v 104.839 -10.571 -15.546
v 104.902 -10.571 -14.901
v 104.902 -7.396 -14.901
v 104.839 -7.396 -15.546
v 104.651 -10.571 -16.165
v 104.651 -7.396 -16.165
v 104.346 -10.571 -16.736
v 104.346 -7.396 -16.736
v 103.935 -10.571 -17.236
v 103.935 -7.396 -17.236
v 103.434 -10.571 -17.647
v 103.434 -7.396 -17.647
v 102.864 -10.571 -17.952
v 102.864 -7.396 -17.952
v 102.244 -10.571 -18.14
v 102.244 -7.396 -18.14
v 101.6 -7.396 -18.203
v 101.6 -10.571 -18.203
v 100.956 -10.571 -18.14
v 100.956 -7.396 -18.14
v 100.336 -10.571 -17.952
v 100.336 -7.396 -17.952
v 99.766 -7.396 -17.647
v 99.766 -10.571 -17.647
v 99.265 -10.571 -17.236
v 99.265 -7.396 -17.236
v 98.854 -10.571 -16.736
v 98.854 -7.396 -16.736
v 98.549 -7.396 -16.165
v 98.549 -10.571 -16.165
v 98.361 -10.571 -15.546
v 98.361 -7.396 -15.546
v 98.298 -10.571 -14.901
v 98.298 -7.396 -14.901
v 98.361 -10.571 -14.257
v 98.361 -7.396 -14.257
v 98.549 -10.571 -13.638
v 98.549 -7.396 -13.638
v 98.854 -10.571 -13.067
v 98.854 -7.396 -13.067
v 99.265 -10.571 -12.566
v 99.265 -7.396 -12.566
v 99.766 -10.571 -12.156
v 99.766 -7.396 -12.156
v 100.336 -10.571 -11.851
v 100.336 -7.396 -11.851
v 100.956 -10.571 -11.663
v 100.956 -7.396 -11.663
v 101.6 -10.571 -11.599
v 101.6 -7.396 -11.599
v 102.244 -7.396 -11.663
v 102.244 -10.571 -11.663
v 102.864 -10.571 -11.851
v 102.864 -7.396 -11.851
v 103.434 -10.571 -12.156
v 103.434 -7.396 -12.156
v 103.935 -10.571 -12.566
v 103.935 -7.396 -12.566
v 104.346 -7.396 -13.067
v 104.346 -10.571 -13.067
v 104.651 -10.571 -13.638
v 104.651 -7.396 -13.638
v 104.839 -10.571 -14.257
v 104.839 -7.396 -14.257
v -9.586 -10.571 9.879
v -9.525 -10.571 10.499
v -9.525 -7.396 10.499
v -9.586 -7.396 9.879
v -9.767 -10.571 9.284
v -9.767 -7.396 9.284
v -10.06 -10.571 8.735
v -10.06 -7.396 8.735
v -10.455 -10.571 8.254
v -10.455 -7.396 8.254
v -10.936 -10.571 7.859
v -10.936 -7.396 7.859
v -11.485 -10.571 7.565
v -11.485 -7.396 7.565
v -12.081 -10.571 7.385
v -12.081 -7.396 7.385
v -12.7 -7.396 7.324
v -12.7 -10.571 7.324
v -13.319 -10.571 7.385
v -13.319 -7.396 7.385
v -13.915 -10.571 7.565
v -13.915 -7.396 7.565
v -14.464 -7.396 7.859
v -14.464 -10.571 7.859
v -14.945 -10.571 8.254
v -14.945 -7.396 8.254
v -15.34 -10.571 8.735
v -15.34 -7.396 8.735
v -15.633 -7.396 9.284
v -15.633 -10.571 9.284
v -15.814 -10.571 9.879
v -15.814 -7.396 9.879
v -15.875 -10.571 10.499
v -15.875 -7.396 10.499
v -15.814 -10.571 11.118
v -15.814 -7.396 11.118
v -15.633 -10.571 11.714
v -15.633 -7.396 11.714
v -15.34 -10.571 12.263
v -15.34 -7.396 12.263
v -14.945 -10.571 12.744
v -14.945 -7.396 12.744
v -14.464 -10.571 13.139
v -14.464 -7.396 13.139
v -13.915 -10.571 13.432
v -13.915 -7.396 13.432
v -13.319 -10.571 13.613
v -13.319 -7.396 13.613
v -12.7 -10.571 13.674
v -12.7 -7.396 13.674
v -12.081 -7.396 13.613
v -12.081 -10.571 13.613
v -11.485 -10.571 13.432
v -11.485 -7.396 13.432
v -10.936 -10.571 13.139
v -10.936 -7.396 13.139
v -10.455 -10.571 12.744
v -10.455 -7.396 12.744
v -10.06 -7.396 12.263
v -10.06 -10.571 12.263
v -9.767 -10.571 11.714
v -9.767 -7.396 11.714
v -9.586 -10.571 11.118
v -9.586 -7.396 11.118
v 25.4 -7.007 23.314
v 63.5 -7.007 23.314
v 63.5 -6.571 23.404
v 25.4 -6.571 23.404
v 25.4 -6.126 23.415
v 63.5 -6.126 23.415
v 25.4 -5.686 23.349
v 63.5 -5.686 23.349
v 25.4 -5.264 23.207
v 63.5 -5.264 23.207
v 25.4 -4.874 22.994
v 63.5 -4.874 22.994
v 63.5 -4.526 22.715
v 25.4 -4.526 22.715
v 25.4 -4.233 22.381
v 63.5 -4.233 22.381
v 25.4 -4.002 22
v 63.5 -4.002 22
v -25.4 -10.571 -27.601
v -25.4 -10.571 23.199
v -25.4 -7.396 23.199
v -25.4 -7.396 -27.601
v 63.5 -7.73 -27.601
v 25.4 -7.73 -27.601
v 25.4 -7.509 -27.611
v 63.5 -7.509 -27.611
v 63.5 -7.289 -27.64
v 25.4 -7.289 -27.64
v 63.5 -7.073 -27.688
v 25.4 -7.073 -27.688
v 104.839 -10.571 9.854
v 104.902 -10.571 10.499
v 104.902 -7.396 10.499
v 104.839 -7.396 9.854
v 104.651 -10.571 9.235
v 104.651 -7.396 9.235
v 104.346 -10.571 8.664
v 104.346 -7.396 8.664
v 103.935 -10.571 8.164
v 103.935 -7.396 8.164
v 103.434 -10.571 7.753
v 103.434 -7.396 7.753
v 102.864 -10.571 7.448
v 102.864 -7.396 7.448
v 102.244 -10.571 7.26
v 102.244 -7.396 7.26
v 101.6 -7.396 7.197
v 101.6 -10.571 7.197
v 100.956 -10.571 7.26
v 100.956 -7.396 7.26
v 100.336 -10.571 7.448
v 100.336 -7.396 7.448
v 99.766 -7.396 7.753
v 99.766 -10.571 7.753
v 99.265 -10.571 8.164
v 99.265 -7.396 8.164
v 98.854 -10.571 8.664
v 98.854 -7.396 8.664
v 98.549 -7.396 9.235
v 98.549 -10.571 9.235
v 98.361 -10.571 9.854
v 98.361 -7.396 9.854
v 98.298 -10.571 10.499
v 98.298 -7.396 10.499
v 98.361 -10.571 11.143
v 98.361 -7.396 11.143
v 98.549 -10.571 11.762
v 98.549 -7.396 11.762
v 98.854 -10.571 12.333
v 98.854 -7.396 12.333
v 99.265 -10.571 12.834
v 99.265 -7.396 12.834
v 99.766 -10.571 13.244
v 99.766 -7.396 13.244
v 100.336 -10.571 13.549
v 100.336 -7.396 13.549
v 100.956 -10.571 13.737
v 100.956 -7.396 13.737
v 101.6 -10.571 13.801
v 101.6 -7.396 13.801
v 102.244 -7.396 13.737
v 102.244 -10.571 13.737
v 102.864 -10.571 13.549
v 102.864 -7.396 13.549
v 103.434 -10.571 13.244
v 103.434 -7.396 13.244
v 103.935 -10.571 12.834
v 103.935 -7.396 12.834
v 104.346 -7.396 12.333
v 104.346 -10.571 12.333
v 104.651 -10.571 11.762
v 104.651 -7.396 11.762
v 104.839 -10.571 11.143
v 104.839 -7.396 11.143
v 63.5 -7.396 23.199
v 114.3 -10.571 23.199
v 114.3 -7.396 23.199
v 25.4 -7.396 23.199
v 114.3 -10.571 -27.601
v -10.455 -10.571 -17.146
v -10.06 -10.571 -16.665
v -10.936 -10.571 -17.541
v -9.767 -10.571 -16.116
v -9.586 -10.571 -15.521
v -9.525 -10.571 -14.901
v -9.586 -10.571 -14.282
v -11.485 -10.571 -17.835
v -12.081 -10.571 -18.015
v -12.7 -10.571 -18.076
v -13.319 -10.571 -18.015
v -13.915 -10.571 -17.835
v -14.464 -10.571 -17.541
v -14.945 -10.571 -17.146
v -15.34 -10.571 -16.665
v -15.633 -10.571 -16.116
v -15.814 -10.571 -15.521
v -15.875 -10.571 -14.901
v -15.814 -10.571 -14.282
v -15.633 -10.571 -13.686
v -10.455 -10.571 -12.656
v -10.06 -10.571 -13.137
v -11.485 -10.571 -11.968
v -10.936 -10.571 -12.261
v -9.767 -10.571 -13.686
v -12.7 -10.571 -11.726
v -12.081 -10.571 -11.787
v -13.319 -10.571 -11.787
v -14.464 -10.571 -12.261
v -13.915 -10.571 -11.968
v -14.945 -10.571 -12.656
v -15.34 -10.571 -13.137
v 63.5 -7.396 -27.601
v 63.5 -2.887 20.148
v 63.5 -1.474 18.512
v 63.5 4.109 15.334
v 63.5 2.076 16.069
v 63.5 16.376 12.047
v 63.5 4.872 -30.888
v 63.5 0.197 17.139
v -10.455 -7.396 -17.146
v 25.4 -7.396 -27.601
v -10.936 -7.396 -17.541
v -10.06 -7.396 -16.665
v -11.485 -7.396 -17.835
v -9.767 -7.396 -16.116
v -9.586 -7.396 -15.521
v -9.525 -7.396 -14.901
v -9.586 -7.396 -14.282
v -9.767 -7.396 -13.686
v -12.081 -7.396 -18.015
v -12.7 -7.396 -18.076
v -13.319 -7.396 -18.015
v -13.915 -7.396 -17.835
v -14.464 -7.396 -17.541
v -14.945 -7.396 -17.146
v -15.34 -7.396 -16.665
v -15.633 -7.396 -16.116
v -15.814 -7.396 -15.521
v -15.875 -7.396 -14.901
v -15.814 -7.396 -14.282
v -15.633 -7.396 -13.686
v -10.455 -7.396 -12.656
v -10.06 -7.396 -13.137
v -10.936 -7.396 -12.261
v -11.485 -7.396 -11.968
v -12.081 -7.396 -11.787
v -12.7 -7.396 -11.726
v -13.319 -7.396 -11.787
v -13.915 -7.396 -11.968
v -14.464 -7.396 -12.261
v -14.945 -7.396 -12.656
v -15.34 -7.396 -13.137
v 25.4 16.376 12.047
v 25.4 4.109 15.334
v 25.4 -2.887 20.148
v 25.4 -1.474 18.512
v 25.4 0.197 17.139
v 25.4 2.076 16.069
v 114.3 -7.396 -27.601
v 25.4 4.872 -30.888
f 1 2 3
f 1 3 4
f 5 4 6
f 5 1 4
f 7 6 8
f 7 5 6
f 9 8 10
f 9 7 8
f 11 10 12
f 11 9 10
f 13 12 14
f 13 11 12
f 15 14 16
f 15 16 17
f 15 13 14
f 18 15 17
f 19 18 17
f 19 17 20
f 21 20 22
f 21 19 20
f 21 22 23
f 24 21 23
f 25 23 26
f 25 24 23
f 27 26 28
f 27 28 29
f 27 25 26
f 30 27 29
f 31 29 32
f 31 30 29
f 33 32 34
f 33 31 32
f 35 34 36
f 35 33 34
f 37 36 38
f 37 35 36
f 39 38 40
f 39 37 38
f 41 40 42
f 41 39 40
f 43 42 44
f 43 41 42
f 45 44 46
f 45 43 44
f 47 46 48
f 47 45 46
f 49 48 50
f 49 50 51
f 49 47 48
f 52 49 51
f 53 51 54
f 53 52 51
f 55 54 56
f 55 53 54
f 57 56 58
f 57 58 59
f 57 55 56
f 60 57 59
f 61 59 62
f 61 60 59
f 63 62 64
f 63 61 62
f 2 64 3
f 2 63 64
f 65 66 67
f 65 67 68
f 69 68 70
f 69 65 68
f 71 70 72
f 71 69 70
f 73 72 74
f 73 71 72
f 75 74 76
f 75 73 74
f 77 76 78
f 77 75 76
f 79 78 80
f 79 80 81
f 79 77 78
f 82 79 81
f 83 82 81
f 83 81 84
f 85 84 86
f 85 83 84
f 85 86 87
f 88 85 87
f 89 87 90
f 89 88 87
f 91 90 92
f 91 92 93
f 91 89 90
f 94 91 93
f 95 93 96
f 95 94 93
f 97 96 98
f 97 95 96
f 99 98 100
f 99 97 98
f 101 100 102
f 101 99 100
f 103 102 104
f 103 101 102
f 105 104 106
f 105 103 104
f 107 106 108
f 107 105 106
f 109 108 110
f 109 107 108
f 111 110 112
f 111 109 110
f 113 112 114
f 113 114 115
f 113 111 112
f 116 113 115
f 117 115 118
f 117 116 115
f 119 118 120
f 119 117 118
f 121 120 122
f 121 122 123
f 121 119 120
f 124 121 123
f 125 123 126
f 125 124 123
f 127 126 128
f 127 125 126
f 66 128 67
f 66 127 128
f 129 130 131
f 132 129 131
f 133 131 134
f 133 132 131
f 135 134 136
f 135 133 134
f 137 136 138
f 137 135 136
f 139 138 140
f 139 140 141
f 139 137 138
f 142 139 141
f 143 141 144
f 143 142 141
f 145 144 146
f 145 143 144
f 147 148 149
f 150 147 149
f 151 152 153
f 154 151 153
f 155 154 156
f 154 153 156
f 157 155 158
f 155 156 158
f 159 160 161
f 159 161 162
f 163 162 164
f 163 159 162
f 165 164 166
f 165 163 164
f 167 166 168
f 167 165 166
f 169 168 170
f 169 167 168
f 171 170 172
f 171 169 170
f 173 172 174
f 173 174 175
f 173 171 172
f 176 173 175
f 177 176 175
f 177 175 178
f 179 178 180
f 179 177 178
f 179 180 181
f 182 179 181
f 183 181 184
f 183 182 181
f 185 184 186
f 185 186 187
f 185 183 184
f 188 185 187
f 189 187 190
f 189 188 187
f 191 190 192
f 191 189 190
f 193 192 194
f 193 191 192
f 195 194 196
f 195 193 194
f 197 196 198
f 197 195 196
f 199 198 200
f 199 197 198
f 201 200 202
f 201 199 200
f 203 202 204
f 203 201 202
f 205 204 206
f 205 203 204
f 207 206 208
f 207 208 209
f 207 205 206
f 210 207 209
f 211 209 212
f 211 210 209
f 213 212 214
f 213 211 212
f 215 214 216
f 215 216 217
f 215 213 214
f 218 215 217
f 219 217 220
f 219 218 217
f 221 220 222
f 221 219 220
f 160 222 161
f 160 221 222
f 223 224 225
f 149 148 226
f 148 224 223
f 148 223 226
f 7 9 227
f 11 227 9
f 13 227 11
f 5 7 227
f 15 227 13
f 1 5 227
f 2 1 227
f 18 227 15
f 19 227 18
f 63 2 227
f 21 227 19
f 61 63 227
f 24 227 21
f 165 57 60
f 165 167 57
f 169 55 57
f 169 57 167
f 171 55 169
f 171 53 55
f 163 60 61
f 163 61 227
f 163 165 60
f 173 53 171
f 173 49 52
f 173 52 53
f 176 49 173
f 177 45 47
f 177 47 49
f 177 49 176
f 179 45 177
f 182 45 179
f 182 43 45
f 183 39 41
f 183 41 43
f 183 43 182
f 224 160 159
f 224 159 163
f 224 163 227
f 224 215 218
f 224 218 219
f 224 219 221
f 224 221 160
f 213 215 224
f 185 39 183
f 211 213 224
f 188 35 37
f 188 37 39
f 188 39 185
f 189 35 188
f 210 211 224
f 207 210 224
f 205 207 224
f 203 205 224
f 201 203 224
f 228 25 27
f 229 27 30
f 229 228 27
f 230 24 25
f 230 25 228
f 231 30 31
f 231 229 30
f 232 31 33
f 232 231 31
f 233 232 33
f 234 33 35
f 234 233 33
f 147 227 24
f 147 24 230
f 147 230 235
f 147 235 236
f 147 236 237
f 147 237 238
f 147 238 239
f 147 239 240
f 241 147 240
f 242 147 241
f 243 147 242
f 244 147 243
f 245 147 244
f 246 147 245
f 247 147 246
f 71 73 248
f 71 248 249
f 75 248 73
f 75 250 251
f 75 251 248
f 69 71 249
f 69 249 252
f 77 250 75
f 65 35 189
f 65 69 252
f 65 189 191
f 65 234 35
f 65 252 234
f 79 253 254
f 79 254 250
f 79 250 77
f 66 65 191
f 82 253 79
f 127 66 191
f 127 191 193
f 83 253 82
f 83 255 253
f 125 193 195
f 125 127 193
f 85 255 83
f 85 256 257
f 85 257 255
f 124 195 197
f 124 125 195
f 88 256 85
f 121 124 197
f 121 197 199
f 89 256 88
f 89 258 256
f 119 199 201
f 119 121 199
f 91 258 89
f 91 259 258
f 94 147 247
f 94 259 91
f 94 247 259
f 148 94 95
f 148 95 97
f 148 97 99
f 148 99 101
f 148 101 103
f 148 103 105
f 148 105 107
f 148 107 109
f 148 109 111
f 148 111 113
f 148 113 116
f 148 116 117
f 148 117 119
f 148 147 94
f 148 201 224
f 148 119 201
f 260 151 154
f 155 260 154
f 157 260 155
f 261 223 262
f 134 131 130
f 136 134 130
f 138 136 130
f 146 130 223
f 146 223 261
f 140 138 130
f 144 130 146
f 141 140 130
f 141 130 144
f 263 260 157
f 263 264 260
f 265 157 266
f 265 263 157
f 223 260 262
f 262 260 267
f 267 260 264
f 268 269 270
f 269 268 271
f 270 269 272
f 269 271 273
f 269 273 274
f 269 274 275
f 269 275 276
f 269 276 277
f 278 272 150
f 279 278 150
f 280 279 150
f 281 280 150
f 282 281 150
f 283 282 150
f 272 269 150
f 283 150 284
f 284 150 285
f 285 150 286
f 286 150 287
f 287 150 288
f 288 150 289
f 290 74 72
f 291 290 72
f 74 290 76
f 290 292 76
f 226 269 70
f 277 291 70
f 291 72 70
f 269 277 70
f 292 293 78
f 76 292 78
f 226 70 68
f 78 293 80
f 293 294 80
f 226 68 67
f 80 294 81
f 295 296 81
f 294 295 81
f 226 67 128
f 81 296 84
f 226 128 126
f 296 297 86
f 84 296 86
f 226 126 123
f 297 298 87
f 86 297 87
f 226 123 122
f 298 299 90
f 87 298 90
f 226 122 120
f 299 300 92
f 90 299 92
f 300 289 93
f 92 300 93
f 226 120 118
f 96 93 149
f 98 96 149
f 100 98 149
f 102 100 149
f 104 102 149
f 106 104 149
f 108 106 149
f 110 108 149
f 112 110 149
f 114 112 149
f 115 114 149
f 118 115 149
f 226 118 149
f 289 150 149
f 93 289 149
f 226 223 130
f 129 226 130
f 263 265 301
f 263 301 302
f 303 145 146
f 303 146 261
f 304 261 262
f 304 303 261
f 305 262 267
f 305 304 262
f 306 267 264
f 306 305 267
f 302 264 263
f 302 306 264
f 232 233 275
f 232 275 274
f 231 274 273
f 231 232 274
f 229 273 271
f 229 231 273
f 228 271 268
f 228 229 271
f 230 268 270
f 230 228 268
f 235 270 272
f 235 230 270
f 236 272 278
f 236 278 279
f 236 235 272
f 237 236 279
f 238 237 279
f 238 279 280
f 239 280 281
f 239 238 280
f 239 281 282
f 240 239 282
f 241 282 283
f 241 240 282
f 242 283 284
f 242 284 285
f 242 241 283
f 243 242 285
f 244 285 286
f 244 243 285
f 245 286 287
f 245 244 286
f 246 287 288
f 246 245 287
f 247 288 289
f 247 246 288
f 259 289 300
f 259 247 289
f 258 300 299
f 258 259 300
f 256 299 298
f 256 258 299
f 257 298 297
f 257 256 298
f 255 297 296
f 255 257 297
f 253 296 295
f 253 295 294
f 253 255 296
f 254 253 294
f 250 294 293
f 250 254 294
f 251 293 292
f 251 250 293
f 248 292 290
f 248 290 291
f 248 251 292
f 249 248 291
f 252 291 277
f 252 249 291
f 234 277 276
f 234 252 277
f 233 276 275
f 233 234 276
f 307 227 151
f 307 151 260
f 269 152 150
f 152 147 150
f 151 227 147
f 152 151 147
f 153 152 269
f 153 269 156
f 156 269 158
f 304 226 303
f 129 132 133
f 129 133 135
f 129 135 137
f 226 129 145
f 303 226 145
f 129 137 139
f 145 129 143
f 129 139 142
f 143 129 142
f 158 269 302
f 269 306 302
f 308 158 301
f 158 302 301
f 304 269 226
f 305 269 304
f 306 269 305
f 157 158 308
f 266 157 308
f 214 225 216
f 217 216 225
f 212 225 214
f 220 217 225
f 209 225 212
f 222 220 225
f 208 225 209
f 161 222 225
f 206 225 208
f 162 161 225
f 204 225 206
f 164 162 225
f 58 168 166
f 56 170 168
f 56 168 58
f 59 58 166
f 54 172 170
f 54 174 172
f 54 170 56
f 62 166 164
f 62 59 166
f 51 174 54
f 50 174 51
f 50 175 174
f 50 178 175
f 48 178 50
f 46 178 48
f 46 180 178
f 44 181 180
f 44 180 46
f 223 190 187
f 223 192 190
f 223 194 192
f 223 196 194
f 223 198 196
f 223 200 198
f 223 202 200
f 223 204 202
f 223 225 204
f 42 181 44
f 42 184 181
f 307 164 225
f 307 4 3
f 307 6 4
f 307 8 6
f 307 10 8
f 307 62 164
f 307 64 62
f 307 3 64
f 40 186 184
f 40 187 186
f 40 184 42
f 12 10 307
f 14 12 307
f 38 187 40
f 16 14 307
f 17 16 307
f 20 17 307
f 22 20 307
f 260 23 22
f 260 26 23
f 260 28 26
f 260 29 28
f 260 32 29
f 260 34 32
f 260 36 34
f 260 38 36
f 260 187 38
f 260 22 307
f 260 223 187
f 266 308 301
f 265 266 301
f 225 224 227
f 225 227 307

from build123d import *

# Parameters (mm, degrees)
BOSS_EXTRUDE1_DEPTH   = 88.9
SKETCH2_W             = 88.9
SKETCH2_H             = 50.8
BOSS_EXTRUDE2_DEPTH   = 3.175
FILLET2_DEPTH         = 25.4
FILLET2_START         = 63.5
FILLET2_2_DEPTH       = 25.4
FILLET2_START_2       = 25.4
FILLET2_3_DEPTH       = 38.1
FILLET2_4_DEPTH       = 38.1
FILLET2_START_3       = -25.4
FILLET2_5_OUTLINE_W   = 3.175
FILLET2_5_OUTLINE_H   = 50.8
FILLET2_5_DEPTH       = 139.7
FILLET2_START_4       = -10.570754214
FILLET2_6_OUTLINE_R   = 3.302
FILLET2_6_OUTLINE_R_2 = 3.175
FILLET2_6_DEPTH       = 3.175


with BuildPart() as part:
    # Sketch1 → Boss-Extrude1 (new body)
    with BuildSketch(Plane(origin=(0, 0, 0), x_dir=(0, 0, -1), z_dir=(1, 0, 0))):
        Polygon((27.601330486, -7.395754214), (-23.198669514, -7.395754214), (-27.601330486, 7.395754214), align=None)
    extrude(amount=BOSS_EXTRUDE1_DEPTH)

    # Sketch2 → Boss-Extrude2 (add)
    with BuildSketch(Plane.XZ.offset(7.395754214)):
        with Locations((44.45, -2.201330486)):
            Rectangle(SKETCH2_W, SKETCH2_H)
    extrude(amount=BOSS_EXTRUDE2_DEPTH)

    # Fillet2: read off the stored shape, not the designer's step
    # Fillet2 outline → Fillet2 (cut)
    with BuildSketch(Plane.YZ):
        Polygon((-7.395754214, 23.198669514), (-7.395754214, -27.601330486), (7.395754214, 27.601330486), align=None)
    extrude(amount=FILLET2_DEPTH, mode=Mode.SUBTRACT)

    # Fillet2 2 outline → Fillet2 2 (cut)
    with BuildSketch(Plane.YZ.offset(FILLET2_START)):
        Polygon((-7.395754214, 23.198669514), (-7.395754214, -27.601330486), (7.395754214, 27.601330486), align=None)
    extrude(amount=FILLET2_2_DEPTH, mode=Mode.SUBTRACT)

    # Fillet2 3 outline → Fillet2 3 (cut)
    with BuildSketch(Plane.YZ.offset(FILLET2_START_2)):
        with BuildLine():
            Line((7.395754214, 27.601330486), (-7.00664086, 23.314488275))
            ThreePointArc((-7.00664086, 23.314488275), (-5.264031089, 23.20711322), (-4.002401192, 22.000254398))
            ThreePointArc((-4.002401192, 22.000254398), (-0.667927102, 17.789753466), (4.108752341, 15.334072492))
            Line((4.108752341, 15.334072492), (7.395754214, 27.601330486))
        make_face()
    extrude(amount=FILLET2_3_DEPTH, mode=Mode.SUBTRACT)

    # Fillet2 4 outline → Fillet2 4 (add)
    with BuildSketch(Plane.YZ.offset(FILLET2_START_2)):
        with BuildLine():
            Line((4.108752341, 15.334072492), (-7.395754214, -27.601330486))
            Line((-7.395754214, -27.601330486), (-7.730151558, -27.601330486))
            ThreePointArc((-7.730151558, -27.601330486), (-7.39861503, -27.623060538), (-7.072751183, -27.687878887))
            Line((-7.072751183, -27.687878887), (4.87150378, -30.888332359))
            Line((4.87150378, -30.888332359), (16.376010335, 12.04707062))
            Line((16.376010335, 12.04707062), (4.108752341, 15.334072492))
        make_face()
    extrude(amount=FILLET2_4_DEPTH)

    # Fillet2 5 outline → Fillet2 5 (add)
    with BuildSketch(Plane.YZ.offset(FILLET2_START_3)):
        with Locations((-8.983254214, -2.201330486)):
            Rectangle(FILLET2_5_OUTLINE_W, FILLET2_5_OUTLINE_H)
    extrude(amount=FILLET2_5_DEPTH)

    # Fillet2 6 outline → Fillet2 6 (cut)
    with BuildSketch(Plane(origin=(0, 0, 0), x_dir=(1, 0, 0), z_dir=(0, 1, 0)).offset(FILLET2_START_4)):
        with Locations((101.6, -10.498669514)):
            Circle(FILLET2_6_OUTLINE_R)
        with Locations((101.6, 14.901330486)):
            Circle(FILLET2_6_OUTLINE_R)
        with Locations((-12.7, -10.498669514)):
            Circle(FILLET2_6_OUTLINE_R_2)
        with Locations((-12.7, 14.901330486)):
            Circle(FILLET2_6_OUTLINE_R_2)
    extrude(amount=FILLET2_6_DEPTH, mode=Mode.SUBTRACT)


solid = part.part
